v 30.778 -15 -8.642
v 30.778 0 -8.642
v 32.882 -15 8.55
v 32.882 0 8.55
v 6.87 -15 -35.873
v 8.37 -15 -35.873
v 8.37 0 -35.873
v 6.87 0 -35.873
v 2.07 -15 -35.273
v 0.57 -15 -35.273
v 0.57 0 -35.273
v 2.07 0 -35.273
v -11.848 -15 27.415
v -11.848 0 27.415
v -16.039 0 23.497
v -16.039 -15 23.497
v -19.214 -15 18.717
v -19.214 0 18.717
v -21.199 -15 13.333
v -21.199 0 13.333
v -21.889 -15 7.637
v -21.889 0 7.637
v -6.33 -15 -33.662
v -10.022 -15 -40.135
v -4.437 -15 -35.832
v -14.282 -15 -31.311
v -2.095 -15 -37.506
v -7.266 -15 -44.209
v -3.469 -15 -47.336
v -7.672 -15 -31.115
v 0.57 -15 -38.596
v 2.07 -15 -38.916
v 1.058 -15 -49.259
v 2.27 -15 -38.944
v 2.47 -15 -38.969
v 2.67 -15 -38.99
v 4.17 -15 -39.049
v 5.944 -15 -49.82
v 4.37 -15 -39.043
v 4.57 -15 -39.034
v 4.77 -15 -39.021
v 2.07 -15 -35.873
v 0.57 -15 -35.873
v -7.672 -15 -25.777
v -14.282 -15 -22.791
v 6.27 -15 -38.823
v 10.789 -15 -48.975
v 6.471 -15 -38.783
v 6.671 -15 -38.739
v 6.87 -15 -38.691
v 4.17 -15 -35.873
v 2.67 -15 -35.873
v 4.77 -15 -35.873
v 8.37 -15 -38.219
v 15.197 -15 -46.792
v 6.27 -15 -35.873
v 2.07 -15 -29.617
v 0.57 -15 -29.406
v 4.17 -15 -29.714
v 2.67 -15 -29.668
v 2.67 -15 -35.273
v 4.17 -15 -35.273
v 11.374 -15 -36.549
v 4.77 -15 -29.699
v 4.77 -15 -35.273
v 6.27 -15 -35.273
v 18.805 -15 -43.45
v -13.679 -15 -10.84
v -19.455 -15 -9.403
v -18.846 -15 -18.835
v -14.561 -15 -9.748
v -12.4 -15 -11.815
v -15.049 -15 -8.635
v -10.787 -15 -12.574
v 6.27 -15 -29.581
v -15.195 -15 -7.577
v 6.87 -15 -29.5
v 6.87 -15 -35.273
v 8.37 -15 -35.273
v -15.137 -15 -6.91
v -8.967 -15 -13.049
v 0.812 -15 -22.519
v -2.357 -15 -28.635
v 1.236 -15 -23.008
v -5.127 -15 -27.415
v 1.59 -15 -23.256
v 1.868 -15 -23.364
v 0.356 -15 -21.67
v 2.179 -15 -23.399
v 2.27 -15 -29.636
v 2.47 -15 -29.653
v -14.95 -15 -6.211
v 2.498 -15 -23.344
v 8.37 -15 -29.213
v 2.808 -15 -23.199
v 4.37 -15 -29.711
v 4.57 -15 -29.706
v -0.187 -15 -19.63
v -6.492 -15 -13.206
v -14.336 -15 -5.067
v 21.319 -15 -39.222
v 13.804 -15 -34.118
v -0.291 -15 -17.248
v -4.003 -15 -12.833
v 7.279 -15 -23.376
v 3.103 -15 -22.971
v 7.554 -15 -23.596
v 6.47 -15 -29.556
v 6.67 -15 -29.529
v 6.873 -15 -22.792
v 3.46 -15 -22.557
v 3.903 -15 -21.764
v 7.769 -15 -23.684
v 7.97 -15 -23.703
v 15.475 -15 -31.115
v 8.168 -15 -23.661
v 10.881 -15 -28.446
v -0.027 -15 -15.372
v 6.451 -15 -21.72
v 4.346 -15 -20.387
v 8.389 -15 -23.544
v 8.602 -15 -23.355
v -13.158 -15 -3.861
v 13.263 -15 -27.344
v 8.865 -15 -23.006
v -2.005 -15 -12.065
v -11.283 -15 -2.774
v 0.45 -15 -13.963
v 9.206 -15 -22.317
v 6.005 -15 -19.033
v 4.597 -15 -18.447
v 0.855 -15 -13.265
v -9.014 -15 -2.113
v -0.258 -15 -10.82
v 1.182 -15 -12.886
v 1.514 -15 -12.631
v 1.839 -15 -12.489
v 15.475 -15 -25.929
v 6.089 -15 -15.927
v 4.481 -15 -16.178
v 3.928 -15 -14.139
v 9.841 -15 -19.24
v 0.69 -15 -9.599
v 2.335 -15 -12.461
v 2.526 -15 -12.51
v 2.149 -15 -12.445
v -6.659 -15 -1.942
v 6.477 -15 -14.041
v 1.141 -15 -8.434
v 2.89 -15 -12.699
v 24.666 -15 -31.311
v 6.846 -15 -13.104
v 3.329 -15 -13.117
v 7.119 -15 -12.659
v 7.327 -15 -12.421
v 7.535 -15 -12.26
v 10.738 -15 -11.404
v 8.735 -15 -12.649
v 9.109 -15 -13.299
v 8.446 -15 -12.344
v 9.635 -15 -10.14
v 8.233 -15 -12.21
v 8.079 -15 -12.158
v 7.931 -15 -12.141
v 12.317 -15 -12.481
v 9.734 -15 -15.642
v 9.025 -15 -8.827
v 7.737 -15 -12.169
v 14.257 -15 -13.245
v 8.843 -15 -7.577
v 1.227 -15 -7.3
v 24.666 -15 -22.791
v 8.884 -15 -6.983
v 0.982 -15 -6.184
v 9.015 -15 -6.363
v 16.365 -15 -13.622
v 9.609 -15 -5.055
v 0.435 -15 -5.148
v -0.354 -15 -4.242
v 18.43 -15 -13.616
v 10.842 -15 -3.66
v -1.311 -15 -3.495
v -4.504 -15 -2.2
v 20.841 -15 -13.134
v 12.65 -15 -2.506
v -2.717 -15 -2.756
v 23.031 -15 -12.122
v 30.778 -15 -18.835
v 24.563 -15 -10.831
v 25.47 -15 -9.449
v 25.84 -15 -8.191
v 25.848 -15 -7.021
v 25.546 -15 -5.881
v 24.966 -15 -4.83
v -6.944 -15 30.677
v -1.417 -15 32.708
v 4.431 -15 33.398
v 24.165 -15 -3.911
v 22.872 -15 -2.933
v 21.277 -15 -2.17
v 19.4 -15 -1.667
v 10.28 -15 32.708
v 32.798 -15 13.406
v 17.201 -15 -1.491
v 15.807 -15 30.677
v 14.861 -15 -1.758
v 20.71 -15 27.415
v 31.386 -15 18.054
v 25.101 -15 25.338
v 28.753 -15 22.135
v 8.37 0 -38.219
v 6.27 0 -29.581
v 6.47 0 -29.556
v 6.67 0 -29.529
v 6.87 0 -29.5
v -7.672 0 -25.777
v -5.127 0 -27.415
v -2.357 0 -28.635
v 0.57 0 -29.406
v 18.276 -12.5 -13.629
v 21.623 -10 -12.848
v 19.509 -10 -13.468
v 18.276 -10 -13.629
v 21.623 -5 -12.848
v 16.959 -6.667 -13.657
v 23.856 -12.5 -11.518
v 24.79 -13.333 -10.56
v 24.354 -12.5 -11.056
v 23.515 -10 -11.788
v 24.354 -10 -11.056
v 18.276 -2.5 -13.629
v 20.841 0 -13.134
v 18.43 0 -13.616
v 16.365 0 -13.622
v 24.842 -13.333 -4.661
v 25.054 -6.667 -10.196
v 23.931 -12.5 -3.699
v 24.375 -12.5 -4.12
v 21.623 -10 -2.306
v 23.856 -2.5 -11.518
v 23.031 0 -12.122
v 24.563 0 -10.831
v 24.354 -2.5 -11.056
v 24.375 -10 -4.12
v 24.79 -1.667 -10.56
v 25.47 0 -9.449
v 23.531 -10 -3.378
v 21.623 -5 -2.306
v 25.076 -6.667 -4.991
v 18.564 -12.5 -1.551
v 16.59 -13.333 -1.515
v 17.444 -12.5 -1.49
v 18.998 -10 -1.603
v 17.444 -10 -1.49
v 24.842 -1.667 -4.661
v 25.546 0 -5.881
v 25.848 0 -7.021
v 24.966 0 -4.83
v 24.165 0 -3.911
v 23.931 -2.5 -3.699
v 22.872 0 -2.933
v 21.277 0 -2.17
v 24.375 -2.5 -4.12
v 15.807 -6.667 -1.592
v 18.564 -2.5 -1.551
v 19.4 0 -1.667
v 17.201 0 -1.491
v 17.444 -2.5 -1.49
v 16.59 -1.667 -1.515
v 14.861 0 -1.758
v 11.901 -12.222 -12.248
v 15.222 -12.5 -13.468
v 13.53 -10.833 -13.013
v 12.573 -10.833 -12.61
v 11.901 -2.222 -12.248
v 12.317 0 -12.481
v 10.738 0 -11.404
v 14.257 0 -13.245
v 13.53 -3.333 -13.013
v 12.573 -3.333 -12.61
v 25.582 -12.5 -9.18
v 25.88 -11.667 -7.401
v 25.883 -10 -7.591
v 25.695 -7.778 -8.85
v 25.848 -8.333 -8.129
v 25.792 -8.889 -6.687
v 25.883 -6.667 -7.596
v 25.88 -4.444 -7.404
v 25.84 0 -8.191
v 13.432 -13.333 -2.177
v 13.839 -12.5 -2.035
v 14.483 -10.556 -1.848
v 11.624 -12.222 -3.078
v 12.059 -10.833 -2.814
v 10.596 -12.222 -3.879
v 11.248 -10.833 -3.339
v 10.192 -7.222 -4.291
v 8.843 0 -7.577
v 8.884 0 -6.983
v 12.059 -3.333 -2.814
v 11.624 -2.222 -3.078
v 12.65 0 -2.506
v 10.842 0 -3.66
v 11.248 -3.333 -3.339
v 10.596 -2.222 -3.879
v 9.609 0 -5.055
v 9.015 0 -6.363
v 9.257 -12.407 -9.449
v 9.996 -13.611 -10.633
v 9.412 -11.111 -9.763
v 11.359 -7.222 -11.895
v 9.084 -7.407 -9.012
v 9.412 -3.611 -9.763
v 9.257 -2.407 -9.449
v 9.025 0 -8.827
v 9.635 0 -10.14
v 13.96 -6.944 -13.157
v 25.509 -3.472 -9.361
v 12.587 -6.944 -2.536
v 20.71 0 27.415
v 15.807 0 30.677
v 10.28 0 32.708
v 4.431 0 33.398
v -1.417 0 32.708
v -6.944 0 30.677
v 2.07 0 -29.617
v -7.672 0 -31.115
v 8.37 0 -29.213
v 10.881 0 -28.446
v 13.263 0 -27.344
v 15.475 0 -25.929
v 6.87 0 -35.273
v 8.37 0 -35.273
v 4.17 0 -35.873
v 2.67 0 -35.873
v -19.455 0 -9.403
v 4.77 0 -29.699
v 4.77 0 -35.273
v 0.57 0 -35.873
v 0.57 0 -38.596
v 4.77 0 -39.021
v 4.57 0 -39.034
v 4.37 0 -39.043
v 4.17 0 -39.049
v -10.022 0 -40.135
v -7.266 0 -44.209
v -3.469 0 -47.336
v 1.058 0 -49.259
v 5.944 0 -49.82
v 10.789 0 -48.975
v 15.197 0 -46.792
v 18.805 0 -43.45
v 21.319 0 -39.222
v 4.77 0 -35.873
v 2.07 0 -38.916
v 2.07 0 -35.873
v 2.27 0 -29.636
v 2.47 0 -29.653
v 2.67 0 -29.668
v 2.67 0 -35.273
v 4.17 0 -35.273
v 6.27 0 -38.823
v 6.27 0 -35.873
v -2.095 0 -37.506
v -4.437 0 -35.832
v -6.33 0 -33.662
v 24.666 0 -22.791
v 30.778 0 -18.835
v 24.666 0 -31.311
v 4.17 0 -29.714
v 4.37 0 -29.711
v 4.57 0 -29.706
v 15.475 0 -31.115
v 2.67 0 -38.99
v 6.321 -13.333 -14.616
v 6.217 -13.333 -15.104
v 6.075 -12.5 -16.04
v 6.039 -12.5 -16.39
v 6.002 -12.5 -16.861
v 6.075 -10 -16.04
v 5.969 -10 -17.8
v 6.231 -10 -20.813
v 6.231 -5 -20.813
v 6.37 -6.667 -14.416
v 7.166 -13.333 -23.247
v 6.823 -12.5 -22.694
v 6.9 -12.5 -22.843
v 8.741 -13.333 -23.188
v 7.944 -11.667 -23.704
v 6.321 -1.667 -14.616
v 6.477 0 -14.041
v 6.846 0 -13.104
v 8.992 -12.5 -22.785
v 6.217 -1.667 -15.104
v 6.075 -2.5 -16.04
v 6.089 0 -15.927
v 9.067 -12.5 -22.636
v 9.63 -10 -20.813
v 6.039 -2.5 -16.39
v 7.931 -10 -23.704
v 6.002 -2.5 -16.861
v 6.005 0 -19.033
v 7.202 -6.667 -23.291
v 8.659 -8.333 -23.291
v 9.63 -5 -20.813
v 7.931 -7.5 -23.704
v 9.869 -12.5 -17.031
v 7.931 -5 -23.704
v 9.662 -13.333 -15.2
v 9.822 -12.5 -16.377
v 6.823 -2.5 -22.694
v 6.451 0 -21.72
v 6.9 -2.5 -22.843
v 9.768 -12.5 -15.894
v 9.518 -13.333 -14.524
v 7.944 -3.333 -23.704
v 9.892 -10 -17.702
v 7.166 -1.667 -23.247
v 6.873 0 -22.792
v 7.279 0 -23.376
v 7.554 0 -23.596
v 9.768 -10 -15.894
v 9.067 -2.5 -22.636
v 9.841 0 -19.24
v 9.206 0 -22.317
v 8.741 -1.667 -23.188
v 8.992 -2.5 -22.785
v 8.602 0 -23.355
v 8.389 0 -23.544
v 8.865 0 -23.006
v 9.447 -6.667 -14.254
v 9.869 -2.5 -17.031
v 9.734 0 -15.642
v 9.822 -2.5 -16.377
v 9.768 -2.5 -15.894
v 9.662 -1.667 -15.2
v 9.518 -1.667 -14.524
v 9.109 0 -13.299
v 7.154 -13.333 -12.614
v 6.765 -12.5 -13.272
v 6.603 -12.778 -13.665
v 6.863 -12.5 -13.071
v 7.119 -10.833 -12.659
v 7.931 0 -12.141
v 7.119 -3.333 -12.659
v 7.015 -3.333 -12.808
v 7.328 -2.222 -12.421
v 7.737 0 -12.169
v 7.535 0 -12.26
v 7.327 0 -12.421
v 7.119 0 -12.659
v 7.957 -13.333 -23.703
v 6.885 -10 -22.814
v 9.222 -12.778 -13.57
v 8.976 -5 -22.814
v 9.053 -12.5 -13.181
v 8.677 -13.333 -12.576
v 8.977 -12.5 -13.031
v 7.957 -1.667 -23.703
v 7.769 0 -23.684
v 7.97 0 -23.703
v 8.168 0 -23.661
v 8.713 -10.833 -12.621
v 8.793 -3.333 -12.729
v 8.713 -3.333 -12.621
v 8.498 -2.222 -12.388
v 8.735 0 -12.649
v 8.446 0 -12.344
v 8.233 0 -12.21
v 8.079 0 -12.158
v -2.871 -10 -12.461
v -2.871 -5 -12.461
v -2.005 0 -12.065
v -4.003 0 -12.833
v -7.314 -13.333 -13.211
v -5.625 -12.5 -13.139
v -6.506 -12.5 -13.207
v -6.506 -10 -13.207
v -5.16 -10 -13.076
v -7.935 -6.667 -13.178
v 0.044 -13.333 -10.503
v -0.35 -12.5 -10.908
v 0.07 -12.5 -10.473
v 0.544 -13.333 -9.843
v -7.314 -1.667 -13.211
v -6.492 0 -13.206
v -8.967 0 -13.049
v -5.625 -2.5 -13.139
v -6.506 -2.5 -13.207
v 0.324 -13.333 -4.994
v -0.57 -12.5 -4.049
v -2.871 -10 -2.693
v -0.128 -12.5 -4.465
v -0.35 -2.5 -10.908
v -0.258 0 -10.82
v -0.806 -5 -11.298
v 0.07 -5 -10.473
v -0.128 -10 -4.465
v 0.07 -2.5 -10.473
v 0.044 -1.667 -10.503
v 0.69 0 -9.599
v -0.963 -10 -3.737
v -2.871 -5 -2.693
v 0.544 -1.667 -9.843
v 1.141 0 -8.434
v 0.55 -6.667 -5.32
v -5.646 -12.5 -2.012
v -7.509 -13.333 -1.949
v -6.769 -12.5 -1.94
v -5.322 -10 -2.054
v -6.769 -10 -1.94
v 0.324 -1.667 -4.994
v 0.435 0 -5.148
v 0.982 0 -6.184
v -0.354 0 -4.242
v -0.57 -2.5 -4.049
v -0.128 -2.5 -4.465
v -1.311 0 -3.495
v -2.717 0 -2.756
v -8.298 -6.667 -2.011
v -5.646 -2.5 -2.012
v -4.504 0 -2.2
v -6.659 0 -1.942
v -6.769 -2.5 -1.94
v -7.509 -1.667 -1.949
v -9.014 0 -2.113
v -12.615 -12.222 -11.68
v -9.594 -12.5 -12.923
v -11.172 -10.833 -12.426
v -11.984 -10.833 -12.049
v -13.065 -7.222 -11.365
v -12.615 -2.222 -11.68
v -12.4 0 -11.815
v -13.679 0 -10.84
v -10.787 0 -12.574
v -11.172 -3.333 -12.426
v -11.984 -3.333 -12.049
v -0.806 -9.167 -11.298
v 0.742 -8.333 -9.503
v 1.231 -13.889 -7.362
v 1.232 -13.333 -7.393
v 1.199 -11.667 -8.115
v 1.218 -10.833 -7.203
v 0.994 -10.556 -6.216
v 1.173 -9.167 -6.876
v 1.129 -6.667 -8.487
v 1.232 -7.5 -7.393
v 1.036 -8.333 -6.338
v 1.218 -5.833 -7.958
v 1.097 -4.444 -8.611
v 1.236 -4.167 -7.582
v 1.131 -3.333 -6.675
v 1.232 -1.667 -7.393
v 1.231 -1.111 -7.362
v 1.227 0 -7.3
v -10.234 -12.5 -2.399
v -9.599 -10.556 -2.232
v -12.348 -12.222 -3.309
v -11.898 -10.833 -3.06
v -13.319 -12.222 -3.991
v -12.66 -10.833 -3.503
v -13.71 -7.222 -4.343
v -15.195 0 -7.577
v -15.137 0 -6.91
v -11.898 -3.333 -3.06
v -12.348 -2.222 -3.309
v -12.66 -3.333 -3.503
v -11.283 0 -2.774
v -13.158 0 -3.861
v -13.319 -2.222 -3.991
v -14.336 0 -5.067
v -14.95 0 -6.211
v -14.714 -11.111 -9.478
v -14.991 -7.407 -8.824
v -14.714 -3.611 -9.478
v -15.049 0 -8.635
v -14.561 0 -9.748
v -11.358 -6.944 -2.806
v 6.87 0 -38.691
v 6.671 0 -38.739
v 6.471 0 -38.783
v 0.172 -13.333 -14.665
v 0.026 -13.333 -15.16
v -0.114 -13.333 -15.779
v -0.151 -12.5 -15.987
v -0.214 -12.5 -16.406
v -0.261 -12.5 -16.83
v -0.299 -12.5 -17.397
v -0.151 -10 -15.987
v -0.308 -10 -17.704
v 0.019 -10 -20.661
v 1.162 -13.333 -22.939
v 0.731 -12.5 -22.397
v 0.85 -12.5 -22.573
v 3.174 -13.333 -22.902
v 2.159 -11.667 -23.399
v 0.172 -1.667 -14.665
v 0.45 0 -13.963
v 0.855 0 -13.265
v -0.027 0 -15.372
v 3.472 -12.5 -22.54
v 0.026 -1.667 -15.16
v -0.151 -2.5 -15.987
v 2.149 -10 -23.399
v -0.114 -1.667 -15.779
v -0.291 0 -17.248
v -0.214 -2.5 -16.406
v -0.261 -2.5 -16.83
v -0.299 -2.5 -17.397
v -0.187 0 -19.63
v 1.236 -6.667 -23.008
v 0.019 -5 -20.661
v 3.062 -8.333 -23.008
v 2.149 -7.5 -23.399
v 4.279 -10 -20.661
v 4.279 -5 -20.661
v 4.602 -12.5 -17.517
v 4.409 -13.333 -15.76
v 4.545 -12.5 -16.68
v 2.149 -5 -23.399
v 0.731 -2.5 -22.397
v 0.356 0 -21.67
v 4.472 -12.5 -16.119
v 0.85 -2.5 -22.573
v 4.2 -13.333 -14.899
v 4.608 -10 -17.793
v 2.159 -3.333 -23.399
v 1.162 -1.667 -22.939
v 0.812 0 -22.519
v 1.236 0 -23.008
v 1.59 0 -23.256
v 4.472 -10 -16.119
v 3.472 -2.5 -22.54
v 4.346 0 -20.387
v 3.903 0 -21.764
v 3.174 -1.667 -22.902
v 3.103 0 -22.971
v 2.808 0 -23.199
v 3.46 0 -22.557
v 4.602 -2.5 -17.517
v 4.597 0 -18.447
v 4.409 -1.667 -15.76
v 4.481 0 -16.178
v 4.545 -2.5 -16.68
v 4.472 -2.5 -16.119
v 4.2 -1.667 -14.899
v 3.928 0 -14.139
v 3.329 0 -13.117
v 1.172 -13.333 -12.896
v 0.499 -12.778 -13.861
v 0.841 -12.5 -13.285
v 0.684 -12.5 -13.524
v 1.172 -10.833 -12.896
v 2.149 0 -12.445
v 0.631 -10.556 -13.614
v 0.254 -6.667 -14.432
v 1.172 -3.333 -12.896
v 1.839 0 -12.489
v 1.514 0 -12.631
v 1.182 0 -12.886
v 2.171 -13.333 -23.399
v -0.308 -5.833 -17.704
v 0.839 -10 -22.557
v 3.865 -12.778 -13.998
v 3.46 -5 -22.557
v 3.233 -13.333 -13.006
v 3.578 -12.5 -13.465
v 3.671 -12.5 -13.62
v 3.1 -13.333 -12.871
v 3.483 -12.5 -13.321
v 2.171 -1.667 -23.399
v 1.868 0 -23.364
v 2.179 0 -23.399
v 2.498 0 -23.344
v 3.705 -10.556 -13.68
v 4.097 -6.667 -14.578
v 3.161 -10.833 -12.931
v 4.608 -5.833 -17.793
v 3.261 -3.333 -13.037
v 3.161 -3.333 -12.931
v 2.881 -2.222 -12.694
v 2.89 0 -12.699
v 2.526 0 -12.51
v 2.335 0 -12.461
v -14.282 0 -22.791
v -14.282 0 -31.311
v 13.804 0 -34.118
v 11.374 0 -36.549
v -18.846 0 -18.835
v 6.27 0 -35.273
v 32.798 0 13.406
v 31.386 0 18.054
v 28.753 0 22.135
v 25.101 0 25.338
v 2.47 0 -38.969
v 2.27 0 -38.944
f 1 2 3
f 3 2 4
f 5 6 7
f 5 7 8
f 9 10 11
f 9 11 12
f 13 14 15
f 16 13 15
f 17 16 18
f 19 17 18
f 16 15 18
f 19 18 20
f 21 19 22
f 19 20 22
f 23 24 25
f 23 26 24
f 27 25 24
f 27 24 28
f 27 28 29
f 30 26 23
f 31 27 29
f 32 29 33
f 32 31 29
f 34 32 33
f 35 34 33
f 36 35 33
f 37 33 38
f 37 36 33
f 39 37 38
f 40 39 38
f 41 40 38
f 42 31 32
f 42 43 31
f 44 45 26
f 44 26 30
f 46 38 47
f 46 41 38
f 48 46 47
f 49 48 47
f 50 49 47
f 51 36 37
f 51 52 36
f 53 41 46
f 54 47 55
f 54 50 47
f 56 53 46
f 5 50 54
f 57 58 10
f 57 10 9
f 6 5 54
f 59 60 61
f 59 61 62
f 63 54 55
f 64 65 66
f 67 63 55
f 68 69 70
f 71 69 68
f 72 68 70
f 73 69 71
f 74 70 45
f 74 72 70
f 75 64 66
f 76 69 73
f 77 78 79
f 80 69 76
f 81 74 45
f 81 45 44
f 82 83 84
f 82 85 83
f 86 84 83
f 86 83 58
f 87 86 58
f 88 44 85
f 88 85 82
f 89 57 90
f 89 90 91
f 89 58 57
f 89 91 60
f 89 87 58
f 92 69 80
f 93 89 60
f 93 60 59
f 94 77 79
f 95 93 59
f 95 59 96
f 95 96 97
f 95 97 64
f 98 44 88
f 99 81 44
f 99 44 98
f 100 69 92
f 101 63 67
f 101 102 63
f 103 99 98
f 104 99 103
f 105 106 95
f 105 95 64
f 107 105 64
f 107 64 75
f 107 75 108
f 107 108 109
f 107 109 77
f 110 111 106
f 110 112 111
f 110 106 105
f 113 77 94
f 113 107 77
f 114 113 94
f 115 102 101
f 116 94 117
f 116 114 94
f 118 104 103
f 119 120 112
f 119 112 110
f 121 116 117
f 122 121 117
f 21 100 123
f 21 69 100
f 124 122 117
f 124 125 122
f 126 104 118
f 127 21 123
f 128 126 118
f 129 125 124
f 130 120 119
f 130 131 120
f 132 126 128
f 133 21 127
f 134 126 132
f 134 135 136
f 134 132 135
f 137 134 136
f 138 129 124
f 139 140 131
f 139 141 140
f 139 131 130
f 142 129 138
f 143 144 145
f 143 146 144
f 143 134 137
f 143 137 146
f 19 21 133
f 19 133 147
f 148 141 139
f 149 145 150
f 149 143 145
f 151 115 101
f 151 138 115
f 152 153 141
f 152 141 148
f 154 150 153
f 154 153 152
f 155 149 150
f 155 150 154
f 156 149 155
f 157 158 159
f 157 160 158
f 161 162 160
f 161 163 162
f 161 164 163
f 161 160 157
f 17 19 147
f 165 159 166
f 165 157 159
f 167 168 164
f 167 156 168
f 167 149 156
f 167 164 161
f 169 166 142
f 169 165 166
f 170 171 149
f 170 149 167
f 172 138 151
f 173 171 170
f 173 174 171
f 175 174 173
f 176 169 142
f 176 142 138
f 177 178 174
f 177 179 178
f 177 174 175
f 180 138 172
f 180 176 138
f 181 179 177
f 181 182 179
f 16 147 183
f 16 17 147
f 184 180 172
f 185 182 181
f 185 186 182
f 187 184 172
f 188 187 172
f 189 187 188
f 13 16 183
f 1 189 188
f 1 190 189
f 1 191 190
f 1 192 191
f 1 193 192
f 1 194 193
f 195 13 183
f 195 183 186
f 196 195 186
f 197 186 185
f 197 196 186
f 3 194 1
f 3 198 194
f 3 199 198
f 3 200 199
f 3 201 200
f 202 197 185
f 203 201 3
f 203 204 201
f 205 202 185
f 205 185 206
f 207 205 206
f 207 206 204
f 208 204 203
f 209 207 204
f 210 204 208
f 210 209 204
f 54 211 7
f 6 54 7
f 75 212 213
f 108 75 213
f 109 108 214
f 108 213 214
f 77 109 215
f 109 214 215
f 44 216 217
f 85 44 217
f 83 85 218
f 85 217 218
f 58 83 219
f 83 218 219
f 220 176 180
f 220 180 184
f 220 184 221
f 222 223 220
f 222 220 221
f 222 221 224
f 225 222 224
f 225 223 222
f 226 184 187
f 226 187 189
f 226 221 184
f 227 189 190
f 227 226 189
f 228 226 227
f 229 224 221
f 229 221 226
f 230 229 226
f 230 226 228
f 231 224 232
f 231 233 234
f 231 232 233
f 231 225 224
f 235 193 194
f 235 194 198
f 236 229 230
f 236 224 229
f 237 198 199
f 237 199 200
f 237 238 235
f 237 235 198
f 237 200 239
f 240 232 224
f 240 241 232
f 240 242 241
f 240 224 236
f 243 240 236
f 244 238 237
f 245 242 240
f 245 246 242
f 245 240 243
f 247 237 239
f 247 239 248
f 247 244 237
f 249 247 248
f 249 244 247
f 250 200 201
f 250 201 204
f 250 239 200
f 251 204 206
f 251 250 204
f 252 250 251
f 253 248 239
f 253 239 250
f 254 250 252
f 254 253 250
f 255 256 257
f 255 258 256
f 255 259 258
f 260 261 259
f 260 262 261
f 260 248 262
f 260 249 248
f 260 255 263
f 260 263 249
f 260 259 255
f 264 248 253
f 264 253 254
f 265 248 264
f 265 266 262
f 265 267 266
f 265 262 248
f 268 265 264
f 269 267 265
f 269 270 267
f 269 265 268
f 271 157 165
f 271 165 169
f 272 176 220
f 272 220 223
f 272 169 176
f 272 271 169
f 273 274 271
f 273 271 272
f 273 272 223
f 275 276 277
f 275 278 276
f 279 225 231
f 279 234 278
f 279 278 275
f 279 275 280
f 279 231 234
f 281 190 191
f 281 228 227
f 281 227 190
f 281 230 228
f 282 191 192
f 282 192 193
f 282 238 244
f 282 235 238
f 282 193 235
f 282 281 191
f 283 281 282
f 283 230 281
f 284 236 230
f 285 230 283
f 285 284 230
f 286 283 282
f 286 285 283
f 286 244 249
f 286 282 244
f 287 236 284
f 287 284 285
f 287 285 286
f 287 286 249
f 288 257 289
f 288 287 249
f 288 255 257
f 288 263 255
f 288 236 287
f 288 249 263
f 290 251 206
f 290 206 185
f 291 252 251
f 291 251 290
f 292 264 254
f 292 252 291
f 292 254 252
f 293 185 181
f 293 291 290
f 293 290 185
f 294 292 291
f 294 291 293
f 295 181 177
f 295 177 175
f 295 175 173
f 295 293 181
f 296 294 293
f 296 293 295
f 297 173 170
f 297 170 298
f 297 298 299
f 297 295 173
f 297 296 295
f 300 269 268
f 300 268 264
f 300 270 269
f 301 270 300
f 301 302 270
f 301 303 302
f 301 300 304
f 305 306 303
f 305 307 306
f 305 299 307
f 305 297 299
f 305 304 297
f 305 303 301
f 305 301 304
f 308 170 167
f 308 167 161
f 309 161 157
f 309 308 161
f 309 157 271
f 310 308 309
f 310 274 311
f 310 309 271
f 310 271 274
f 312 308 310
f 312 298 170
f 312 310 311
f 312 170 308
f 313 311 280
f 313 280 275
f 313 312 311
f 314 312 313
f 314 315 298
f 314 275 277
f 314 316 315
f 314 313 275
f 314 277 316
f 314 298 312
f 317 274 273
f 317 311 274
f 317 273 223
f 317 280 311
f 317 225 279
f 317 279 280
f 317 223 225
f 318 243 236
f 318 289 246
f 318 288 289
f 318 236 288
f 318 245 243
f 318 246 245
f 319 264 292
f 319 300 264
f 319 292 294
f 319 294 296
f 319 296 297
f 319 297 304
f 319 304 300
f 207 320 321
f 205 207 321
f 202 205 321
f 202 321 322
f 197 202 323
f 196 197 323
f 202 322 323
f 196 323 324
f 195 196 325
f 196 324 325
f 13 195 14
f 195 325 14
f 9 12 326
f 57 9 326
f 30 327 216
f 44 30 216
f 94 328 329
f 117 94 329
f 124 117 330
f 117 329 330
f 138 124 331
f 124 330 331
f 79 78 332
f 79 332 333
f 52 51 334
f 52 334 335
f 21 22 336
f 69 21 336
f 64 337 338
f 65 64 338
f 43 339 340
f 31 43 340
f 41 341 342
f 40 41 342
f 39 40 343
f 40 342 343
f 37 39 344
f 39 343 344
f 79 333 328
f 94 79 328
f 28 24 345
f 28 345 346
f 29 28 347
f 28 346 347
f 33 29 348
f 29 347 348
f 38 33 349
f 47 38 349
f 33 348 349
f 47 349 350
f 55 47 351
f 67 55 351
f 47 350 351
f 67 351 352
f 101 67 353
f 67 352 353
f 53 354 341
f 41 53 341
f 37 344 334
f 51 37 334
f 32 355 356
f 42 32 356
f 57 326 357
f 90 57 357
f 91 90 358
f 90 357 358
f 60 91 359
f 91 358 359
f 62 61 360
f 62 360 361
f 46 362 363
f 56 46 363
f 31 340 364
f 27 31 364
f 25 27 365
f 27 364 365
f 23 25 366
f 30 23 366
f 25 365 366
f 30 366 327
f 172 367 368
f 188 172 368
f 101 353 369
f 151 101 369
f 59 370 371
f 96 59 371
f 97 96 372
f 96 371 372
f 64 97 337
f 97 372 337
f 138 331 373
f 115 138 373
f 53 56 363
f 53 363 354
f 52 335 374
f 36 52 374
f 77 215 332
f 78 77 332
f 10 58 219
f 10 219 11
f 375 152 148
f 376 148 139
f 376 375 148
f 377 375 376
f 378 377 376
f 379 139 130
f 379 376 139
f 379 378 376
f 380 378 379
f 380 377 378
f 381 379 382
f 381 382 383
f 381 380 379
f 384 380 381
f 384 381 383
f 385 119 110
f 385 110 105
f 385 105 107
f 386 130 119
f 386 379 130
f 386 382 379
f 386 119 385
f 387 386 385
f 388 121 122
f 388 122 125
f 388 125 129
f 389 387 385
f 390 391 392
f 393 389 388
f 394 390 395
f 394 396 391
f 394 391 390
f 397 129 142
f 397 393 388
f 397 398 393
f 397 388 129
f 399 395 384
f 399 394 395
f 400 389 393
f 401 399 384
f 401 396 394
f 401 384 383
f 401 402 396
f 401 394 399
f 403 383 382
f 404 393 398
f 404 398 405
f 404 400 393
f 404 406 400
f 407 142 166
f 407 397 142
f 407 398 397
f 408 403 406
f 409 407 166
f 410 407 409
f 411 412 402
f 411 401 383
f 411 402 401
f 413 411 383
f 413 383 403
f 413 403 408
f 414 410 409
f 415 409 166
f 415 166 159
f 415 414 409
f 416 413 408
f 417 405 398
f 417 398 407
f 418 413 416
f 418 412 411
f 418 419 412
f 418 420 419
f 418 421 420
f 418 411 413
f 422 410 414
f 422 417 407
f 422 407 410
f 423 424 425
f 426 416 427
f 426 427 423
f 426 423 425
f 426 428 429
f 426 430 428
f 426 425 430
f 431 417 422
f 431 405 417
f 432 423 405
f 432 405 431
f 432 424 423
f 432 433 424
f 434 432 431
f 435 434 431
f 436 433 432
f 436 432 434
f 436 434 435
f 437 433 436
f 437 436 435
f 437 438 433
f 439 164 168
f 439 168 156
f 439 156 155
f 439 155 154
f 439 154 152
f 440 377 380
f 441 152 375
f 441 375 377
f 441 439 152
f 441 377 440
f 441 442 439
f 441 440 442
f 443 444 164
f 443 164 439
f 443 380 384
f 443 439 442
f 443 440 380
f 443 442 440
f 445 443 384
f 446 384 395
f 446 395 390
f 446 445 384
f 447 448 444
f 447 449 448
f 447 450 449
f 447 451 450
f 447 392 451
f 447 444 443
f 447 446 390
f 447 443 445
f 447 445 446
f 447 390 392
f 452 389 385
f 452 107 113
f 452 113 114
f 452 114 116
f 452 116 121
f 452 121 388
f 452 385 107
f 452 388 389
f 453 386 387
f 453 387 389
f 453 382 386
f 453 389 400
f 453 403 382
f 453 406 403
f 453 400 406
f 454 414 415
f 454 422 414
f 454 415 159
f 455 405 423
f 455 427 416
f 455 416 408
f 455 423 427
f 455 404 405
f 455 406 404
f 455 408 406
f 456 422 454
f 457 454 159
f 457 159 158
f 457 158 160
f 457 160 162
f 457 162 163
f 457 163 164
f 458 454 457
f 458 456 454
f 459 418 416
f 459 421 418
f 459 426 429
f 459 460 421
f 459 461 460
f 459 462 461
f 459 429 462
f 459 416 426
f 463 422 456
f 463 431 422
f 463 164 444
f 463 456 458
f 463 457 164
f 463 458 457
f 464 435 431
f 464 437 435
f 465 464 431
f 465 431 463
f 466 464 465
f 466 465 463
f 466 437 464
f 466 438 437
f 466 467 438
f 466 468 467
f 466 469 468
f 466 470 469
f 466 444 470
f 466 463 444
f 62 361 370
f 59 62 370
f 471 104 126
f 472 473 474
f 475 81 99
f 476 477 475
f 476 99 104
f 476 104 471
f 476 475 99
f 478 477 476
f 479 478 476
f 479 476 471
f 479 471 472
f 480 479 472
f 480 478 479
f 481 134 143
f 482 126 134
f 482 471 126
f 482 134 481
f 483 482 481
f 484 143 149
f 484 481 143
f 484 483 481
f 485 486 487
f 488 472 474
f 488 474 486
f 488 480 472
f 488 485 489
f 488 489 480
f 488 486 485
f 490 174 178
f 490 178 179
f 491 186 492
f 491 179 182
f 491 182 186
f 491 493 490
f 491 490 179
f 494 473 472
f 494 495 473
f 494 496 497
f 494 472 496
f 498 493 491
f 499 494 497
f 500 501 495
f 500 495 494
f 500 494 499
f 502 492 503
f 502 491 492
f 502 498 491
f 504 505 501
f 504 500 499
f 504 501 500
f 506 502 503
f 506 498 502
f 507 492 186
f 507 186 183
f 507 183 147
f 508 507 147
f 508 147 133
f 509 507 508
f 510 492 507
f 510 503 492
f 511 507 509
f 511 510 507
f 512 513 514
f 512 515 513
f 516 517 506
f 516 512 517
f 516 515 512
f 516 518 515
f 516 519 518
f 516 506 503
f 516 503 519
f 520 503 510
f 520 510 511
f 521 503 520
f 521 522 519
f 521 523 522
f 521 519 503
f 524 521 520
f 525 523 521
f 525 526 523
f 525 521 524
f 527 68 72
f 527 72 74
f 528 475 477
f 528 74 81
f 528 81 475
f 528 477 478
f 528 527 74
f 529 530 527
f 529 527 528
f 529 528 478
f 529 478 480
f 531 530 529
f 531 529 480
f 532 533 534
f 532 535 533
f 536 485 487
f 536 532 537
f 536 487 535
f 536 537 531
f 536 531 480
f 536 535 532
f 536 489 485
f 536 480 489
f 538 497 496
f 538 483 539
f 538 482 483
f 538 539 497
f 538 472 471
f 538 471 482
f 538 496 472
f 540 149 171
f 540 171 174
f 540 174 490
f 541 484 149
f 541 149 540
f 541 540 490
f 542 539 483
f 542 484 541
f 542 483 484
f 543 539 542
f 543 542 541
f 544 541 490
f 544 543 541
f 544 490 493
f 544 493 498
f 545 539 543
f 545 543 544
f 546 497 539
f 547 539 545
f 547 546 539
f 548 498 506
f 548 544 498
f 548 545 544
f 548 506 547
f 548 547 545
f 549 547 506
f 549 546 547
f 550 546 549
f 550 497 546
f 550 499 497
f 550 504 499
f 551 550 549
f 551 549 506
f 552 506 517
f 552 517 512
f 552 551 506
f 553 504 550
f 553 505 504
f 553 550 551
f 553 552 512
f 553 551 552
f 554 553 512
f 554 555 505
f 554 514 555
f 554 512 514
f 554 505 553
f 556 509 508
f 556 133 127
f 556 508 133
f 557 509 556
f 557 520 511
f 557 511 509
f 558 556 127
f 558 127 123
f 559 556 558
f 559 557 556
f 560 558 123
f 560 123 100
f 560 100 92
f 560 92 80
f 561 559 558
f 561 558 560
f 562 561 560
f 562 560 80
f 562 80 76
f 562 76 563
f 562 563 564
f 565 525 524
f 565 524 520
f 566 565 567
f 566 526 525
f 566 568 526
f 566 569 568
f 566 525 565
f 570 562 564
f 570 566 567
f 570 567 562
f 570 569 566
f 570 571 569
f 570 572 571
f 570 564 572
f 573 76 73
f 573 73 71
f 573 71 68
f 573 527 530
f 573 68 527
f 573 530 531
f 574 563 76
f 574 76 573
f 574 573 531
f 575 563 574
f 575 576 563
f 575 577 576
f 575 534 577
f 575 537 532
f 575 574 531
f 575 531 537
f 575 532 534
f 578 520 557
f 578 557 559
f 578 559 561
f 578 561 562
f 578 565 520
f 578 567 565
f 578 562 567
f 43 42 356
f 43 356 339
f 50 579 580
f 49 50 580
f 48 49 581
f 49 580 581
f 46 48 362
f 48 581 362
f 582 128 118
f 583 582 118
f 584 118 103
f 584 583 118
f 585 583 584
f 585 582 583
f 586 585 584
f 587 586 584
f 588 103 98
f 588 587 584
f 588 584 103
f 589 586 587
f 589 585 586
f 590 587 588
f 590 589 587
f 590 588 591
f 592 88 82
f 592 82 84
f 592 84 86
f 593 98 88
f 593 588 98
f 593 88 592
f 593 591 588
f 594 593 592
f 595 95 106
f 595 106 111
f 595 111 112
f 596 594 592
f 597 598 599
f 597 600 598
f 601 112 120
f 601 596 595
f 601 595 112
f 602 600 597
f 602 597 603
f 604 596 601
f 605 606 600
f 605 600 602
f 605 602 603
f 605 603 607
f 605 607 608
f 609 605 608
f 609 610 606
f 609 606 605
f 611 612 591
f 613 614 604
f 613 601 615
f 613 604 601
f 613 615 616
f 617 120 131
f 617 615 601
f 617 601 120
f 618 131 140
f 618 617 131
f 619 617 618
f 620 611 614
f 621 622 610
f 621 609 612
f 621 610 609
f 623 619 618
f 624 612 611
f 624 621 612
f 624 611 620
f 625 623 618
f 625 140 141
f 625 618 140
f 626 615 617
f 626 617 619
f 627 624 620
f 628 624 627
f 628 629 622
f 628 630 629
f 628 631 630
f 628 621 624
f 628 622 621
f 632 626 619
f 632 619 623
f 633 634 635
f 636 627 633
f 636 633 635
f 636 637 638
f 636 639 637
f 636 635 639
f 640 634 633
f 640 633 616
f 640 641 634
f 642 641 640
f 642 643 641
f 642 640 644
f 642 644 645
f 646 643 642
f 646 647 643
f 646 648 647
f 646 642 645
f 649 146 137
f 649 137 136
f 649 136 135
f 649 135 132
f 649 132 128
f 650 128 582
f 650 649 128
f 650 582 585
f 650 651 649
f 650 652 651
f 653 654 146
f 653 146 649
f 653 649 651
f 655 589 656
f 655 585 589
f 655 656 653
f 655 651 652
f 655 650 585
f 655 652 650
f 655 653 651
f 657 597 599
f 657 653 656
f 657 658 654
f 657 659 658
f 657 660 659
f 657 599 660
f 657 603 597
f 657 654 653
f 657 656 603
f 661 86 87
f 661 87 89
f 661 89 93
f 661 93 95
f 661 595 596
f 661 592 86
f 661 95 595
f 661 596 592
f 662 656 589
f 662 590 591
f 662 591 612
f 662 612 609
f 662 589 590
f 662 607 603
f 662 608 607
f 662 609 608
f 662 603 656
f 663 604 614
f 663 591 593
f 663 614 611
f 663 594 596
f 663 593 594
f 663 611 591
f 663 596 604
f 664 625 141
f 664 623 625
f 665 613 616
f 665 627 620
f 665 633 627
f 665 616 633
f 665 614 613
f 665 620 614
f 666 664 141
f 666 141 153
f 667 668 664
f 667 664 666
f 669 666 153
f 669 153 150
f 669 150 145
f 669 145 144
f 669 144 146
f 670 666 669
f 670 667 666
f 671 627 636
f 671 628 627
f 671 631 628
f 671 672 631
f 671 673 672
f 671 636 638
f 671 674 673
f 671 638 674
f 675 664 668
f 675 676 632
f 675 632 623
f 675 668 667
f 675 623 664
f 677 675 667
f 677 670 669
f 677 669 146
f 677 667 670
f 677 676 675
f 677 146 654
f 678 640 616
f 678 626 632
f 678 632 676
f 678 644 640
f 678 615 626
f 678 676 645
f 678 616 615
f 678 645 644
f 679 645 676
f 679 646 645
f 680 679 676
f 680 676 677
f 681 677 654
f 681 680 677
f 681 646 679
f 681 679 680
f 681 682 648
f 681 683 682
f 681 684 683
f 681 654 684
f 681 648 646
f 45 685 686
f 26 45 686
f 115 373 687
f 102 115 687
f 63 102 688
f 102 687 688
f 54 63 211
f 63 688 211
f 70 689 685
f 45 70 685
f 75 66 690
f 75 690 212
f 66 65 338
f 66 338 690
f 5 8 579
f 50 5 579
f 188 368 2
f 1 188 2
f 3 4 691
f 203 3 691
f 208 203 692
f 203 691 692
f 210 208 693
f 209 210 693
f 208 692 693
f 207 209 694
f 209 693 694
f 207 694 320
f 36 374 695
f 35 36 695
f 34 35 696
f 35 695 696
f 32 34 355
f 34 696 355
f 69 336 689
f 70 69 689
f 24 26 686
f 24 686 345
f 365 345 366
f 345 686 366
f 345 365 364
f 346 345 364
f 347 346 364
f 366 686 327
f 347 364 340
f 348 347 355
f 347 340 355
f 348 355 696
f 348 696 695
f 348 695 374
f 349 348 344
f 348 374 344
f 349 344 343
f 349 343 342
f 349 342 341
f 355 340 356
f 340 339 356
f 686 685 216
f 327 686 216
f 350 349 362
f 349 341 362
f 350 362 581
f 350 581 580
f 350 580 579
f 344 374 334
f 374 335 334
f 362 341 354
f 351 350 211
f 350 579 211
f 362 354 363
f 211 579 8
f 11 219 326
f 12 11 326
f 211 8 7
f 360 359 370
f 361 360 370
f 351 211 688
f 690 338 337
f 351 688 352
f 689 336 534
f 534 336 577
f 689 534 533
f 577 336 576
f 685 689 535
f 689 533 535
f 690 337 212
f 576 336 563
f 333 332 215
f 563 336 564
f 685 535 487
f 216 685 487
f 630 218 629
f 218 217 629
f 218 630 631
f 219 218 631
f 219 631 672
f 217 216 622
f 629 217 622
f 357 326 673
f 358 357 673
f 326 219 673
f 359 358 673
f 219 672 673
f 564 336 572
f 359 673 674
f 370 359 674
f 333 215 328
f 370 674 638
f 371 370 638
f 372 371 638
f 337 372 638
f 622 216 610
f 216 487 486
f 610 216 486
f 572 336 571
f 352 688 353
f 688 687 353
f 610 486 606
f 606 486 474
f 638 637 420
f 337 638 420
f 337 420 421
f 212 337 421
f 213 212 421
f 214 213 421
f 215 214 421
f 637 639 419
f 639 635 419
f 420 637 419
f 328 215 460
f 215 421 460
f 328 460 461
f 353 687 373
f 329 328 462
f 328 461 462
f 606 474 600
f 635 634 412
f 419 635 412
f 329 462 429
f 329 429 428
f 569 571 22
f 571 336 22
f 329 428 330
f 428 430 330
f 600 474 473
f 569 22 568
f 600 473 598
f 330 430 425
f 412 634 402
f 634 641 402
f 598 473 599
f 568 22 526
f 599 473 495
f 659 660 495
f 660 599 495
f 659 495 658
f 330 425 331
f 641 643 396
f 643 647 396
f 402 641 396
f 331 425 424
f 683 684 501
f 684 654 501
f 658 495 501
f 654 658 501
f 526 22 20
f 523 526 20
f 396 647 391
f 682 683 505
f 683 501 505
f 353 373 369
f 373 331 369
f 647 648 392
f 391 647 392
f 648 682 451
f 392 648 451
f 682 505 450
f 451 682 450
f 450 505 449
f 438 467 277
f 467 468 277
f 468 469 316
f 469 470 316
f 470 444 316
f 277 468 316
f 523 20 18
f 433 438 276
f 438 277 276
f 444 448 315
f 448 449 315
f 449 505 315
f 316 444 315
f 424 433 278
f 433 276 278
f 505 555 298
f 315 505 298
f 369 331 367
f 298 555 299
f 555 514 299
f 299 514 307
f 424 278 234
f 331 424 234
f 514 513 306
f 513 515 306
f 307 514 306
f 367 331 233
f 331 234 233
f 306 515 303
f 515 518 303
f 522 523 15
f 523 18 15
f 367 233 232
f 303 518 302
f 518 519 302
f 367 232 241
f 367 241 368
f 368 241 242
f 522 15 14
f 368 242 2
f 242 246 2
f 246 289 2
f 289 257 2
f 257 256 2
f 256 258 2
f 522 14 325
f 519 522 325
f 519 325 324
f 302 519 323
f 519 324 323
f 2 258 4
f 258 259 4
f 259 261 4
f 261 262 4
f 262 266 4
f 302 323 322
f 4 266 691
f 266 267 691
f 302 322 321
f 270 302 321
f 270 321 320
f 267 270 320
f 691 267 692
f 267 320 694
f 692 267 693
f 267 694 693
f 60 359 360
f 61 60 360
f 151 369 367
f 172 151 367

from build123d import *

# Parameters (mm, degrees)
F1_DEPTH = 15


with BuildPart() as f1:
    # F0 (on Front) → F1 (new body)
    with BuildSketch(Plane.XZ):
        with BuildLine():
            ThreePointArc((20.710429, 27.415348), (4.431425, 33.39766), (-11.84758, 27.415348))
            ThreePointArc((-11.84758, 27.415348), (-19.213576, 18.716958), (-21.888836, 7.637117))
            Line((-21.888836, 7.637117), (-19.454594, -9.402589))
            Line((-19.454594, -9.402589), (-18.846028, -18.835283))
            Line((-18.846028, -18.835283), (-14.281823, -22.790929))
            Line((-14.281823, -22.790929), (-14.281823, -31.310782))
            Line((-14.281823, -31.310782), (-10.021897, -40.134918))
            ThreePointArc((-10.021897, -40.134918), (5.943942, -49.820405), (21.31899, -39.222076))
            Line((21.31899, -39.222076), (24.666074, -31.310782))
            Line((24.666074, -31.310782), (24.666074, -22.790929))
            Line((24.666074, -22.790929), (30.777754, -18.835283))
            Line((30.777754, -18.835283), (30.777754, -8.641886))
            Line((30.777754, -8.641886), (32.881651, 8.549958))
            ThreePointArc((32.881651, 8.549958), (30.211147, 20.185948), (20.710429, 27.415348))
        make_face()
        with BuildLine():
            Line((-7.671921, -31.11458), (-7.671921, -25.776851))
            ThreePointArc((-7.671921, -25.776851), (-3.765788, -28.079677), (0.570211, -29.406328))
            ThreePointArc((0.570211, -29.406328), (1.318138, -29.526551), (2.070211, -29.617296))
            ThreePointArc((2.070211, -29.617296), (2.370012, -29.645142), (2.670211, -29.668303))
            ThreePointArc((2.670211, -29.668303), (3.419769, -29.705602), (4.170211, -29.713697))
            ThreePointArc((4.170211, -29.713697), (4.470267, -29.708756), (4.770211, -29.699144))
            ThreePointArc((4.770211, -29.699144), (5.521368, -29.65452), (6.270211, -29.580613))
            ThreePointArc((6.270211, -29.580613), (6.570527, -29.542648), (6.870211, -29.499973))
            ThreePointArc((6.870211, -29.499973), (7.623052, -29.371429), (8.370211, -29.213164))
            ThreePointArc((8.370211, -29.213164), (12.090787, -27.935602), (15.474535, -25.929335))
            Line((15.474535, -25.929335), (15.474535, -31.11458))
            ThreePointArc((15.474535, -31.11458), (12.673712, -35.41805), (8.370211, -38.218827))
            ThreePointArc((8.370211, -38.218827), (7.627703, -38.4788), (6.870211, -38.69119))
            ThreePointArc((6.870211, -38.69119), (6.571029, -38.761012), (6.270211, -38.823404))
            ThreePointArc((6.270211, -38.823404), (5.523229, -38.945192), (4.770211, -39.021205))
            ThreePointArc((4.770211, -39.021205), (4.470378, -39.038612), (4.170211, -39.048756))
            ThreePointArc((4.170211, -39.048756), (3.419328, -39.042305), (2.670211, -38.990437))
            ThreePointArc((2.670211, -38.990437), (2.369756, -38.956772), (2.070211, -38.915795))
            ThreePointArc((2.070211, -38.915795), (1.315266, -38.779149), (0.570211, -38.596099))
            ThreePointArc((0.570211, -38.596099), (-4.437038, -35.831617), (-7.671921, -31.11458))
        make_face(mode=Mode.SUBTRACT)
        with BuildLine():
            add(Edge.make_bspline(
                [(2.149325, -12.445394), (-2.110601, -12.445394), (0.019362, -20.660969), (2.149325, -28.876544), (4.279288, -20.660969), (6.409251, -12.445394), (2.149325, -12.445394)],
                knots=[0, 0, 0, 2.094395, 2.094395, 4.18879, 4.18879, 6.283185, 6.283185, 6.283185], degree=2, weights=[1, 0.5, 1, 0.5, 1, 0.5, 1]))
        make_face(mode=Mode.SUBTRACT)
        with BuildLine():
            add(Edge.make_bspline(
                [(7.930652, -12.141115), (4.53183, -12.141115), (6.231241, -20.813109), (7.930652, -29.485103), (9.630063, -20.813109), (11.329474, -12.141115), (7.930652, -12.141115)],
                knots=[0, 0, 0, 2.094395, 2.094395, 4.18879, 4.18879, 6.283185, 6.283185, 6.283185], degree=2, weights=[1, 0.5, 1, 0.5, 1, 0.5, 1]))
        make_face(mode=Mode.SUBTRACT)
        with BuildLine():
            add(Edge.make_bspline(
                [(-15.194664, -7.576907), (-15.194664, -17.344323), (-2.871308, -12.460615), (9.452049, -7.576907), (-2.871308, -2.693199), (-15.194664, 2.190509), (-15.194664, -7.576907)],
                knots=[0, 0, 0, 2.094395, 2.094395, 4.18879, 4.18879, 6.283185, 6.283185, 6.283185], degree=2, weights=[1, 0.5, 1, 0.5, 1, 0.5, 1]))
        make_face(mode=Mode.SUBTRACT)
        with BuildLine():
            add(Edge.make_bspline(
                [(8.843494, -7.576907), (8.843494, -18.119688), (21.623271, -12.848297), (34.403049, -7.576907), (21.623271, -2.305516), (8.843494, 2.965875), (8.843494, -7.576907)],
                knots=[0, 0, 0, 2.094395, 2.094395, 4.18879, 4.18879, 6.283185, 6.283185, 6.283185], degree=2, weights=[1, 0.5, 1, 0.5, 1, 0.5, 1]))
        make_face(mode=Mode.SUBTRACT)
        with BuildLine():
            ThreePointArc((2.070211, -29.617296), (1.318138, -29.526551), (0.570211, -29.406328))
            Line((0.570211, -29.406328), (0.570211, -35.272898))
            Line((0.570211, -35.272898), (2.070211, -35.272898))
            Line((2.070211, -35.272898), (2.070211, -29.617296))
        make_face()
        with BuildLine():
            ThreePointArc((4.170211, -29.713697), (3.419769, -29.705602), (2.670211, -29.668303))
            Line((2.670211, -29.668303), (2.670211, -35.272898))
            Line((2.670211, -35.272898), (4.170211, -35.272898))
            Line((4.170211, -35.272898), (4.170211, -29.713697))
        make_face()
        with BuildLine():
            ThreePointArc((6.270211, -29.580613), (5.521368, -29.65452), (4.770211, -29.699144))
            Line((4.770211, -29.699144), (4.770211, -35.272898))
            Line((4.770211, -35.272898), (6.270211, -35.272898))
            Line((6.270211, -35.272898), (6.270211, -29.580613))
        make_face()
        with BuildLine():
            ThreePointArc((8.370211, -29.213164), (7.623052, -29.371429), (6.870211, -29.499973))
            Line((6.870211, -29.499973), (6.870211, -35.272898))
            Line((6.870211, -35.272898), (8.370211, -35.272898))
            Line((8.370211, -35.272898), (8.370211, -29.213164))
        make_face()
        with BuildLine():
            Line((6.870211, -35.872898), (6.870211, -38.69119))
            ThreePointArc((6.870211, -38.69119), (7.627703, -38.4788), (8.370211, -38.218827))
            Line((8.370211, -38.218827), (8.370211, -35.872898))
            Line((8.370211, -35.872898), (6.870211, -35.872898))
        make_face()
        with BuildLine():
            Line((4.770211, -35.872898), (4.770211, -39.021205))
            ThreePointArc((4.770211, -39.021205), (5.523229, -38.945192), (6.270211, -38.823404))
            Line((6.270211, -38.823404), (6.270211, -35.872898))
            Line((6.270211, -35.872898), (4.770211, -35.872898))
        make_face()
        with BuildLine():
            Line((2.670211, -35.872898), (2.670211, -38.990437))
            ThreePointArc((2.670211, -38.990437), (3.419328, -39.042305), (4.170211, -39.048756))
            Line((4.170211, -39.048756), (4.170211, -35.872898))
            Line((4.170211, -35.872898), (2.670211, -35.872898))
        make_face()
        with BuildLine():
            Line((0.570211, -35.872898), (0.570211, -38.596099))
            ThreePointArc((0.570211, -38.596099), (1.315266, -38.779149), (2.070211, -38.915795))
            Line((2.070211, -38.915795), (2.070211, -35.872898))
            Line((2.070211, -35.872898), (0.570211, -35.872898))
        make_face()
    extrude(amount=F1_DEPTH)


solid = f1.part
